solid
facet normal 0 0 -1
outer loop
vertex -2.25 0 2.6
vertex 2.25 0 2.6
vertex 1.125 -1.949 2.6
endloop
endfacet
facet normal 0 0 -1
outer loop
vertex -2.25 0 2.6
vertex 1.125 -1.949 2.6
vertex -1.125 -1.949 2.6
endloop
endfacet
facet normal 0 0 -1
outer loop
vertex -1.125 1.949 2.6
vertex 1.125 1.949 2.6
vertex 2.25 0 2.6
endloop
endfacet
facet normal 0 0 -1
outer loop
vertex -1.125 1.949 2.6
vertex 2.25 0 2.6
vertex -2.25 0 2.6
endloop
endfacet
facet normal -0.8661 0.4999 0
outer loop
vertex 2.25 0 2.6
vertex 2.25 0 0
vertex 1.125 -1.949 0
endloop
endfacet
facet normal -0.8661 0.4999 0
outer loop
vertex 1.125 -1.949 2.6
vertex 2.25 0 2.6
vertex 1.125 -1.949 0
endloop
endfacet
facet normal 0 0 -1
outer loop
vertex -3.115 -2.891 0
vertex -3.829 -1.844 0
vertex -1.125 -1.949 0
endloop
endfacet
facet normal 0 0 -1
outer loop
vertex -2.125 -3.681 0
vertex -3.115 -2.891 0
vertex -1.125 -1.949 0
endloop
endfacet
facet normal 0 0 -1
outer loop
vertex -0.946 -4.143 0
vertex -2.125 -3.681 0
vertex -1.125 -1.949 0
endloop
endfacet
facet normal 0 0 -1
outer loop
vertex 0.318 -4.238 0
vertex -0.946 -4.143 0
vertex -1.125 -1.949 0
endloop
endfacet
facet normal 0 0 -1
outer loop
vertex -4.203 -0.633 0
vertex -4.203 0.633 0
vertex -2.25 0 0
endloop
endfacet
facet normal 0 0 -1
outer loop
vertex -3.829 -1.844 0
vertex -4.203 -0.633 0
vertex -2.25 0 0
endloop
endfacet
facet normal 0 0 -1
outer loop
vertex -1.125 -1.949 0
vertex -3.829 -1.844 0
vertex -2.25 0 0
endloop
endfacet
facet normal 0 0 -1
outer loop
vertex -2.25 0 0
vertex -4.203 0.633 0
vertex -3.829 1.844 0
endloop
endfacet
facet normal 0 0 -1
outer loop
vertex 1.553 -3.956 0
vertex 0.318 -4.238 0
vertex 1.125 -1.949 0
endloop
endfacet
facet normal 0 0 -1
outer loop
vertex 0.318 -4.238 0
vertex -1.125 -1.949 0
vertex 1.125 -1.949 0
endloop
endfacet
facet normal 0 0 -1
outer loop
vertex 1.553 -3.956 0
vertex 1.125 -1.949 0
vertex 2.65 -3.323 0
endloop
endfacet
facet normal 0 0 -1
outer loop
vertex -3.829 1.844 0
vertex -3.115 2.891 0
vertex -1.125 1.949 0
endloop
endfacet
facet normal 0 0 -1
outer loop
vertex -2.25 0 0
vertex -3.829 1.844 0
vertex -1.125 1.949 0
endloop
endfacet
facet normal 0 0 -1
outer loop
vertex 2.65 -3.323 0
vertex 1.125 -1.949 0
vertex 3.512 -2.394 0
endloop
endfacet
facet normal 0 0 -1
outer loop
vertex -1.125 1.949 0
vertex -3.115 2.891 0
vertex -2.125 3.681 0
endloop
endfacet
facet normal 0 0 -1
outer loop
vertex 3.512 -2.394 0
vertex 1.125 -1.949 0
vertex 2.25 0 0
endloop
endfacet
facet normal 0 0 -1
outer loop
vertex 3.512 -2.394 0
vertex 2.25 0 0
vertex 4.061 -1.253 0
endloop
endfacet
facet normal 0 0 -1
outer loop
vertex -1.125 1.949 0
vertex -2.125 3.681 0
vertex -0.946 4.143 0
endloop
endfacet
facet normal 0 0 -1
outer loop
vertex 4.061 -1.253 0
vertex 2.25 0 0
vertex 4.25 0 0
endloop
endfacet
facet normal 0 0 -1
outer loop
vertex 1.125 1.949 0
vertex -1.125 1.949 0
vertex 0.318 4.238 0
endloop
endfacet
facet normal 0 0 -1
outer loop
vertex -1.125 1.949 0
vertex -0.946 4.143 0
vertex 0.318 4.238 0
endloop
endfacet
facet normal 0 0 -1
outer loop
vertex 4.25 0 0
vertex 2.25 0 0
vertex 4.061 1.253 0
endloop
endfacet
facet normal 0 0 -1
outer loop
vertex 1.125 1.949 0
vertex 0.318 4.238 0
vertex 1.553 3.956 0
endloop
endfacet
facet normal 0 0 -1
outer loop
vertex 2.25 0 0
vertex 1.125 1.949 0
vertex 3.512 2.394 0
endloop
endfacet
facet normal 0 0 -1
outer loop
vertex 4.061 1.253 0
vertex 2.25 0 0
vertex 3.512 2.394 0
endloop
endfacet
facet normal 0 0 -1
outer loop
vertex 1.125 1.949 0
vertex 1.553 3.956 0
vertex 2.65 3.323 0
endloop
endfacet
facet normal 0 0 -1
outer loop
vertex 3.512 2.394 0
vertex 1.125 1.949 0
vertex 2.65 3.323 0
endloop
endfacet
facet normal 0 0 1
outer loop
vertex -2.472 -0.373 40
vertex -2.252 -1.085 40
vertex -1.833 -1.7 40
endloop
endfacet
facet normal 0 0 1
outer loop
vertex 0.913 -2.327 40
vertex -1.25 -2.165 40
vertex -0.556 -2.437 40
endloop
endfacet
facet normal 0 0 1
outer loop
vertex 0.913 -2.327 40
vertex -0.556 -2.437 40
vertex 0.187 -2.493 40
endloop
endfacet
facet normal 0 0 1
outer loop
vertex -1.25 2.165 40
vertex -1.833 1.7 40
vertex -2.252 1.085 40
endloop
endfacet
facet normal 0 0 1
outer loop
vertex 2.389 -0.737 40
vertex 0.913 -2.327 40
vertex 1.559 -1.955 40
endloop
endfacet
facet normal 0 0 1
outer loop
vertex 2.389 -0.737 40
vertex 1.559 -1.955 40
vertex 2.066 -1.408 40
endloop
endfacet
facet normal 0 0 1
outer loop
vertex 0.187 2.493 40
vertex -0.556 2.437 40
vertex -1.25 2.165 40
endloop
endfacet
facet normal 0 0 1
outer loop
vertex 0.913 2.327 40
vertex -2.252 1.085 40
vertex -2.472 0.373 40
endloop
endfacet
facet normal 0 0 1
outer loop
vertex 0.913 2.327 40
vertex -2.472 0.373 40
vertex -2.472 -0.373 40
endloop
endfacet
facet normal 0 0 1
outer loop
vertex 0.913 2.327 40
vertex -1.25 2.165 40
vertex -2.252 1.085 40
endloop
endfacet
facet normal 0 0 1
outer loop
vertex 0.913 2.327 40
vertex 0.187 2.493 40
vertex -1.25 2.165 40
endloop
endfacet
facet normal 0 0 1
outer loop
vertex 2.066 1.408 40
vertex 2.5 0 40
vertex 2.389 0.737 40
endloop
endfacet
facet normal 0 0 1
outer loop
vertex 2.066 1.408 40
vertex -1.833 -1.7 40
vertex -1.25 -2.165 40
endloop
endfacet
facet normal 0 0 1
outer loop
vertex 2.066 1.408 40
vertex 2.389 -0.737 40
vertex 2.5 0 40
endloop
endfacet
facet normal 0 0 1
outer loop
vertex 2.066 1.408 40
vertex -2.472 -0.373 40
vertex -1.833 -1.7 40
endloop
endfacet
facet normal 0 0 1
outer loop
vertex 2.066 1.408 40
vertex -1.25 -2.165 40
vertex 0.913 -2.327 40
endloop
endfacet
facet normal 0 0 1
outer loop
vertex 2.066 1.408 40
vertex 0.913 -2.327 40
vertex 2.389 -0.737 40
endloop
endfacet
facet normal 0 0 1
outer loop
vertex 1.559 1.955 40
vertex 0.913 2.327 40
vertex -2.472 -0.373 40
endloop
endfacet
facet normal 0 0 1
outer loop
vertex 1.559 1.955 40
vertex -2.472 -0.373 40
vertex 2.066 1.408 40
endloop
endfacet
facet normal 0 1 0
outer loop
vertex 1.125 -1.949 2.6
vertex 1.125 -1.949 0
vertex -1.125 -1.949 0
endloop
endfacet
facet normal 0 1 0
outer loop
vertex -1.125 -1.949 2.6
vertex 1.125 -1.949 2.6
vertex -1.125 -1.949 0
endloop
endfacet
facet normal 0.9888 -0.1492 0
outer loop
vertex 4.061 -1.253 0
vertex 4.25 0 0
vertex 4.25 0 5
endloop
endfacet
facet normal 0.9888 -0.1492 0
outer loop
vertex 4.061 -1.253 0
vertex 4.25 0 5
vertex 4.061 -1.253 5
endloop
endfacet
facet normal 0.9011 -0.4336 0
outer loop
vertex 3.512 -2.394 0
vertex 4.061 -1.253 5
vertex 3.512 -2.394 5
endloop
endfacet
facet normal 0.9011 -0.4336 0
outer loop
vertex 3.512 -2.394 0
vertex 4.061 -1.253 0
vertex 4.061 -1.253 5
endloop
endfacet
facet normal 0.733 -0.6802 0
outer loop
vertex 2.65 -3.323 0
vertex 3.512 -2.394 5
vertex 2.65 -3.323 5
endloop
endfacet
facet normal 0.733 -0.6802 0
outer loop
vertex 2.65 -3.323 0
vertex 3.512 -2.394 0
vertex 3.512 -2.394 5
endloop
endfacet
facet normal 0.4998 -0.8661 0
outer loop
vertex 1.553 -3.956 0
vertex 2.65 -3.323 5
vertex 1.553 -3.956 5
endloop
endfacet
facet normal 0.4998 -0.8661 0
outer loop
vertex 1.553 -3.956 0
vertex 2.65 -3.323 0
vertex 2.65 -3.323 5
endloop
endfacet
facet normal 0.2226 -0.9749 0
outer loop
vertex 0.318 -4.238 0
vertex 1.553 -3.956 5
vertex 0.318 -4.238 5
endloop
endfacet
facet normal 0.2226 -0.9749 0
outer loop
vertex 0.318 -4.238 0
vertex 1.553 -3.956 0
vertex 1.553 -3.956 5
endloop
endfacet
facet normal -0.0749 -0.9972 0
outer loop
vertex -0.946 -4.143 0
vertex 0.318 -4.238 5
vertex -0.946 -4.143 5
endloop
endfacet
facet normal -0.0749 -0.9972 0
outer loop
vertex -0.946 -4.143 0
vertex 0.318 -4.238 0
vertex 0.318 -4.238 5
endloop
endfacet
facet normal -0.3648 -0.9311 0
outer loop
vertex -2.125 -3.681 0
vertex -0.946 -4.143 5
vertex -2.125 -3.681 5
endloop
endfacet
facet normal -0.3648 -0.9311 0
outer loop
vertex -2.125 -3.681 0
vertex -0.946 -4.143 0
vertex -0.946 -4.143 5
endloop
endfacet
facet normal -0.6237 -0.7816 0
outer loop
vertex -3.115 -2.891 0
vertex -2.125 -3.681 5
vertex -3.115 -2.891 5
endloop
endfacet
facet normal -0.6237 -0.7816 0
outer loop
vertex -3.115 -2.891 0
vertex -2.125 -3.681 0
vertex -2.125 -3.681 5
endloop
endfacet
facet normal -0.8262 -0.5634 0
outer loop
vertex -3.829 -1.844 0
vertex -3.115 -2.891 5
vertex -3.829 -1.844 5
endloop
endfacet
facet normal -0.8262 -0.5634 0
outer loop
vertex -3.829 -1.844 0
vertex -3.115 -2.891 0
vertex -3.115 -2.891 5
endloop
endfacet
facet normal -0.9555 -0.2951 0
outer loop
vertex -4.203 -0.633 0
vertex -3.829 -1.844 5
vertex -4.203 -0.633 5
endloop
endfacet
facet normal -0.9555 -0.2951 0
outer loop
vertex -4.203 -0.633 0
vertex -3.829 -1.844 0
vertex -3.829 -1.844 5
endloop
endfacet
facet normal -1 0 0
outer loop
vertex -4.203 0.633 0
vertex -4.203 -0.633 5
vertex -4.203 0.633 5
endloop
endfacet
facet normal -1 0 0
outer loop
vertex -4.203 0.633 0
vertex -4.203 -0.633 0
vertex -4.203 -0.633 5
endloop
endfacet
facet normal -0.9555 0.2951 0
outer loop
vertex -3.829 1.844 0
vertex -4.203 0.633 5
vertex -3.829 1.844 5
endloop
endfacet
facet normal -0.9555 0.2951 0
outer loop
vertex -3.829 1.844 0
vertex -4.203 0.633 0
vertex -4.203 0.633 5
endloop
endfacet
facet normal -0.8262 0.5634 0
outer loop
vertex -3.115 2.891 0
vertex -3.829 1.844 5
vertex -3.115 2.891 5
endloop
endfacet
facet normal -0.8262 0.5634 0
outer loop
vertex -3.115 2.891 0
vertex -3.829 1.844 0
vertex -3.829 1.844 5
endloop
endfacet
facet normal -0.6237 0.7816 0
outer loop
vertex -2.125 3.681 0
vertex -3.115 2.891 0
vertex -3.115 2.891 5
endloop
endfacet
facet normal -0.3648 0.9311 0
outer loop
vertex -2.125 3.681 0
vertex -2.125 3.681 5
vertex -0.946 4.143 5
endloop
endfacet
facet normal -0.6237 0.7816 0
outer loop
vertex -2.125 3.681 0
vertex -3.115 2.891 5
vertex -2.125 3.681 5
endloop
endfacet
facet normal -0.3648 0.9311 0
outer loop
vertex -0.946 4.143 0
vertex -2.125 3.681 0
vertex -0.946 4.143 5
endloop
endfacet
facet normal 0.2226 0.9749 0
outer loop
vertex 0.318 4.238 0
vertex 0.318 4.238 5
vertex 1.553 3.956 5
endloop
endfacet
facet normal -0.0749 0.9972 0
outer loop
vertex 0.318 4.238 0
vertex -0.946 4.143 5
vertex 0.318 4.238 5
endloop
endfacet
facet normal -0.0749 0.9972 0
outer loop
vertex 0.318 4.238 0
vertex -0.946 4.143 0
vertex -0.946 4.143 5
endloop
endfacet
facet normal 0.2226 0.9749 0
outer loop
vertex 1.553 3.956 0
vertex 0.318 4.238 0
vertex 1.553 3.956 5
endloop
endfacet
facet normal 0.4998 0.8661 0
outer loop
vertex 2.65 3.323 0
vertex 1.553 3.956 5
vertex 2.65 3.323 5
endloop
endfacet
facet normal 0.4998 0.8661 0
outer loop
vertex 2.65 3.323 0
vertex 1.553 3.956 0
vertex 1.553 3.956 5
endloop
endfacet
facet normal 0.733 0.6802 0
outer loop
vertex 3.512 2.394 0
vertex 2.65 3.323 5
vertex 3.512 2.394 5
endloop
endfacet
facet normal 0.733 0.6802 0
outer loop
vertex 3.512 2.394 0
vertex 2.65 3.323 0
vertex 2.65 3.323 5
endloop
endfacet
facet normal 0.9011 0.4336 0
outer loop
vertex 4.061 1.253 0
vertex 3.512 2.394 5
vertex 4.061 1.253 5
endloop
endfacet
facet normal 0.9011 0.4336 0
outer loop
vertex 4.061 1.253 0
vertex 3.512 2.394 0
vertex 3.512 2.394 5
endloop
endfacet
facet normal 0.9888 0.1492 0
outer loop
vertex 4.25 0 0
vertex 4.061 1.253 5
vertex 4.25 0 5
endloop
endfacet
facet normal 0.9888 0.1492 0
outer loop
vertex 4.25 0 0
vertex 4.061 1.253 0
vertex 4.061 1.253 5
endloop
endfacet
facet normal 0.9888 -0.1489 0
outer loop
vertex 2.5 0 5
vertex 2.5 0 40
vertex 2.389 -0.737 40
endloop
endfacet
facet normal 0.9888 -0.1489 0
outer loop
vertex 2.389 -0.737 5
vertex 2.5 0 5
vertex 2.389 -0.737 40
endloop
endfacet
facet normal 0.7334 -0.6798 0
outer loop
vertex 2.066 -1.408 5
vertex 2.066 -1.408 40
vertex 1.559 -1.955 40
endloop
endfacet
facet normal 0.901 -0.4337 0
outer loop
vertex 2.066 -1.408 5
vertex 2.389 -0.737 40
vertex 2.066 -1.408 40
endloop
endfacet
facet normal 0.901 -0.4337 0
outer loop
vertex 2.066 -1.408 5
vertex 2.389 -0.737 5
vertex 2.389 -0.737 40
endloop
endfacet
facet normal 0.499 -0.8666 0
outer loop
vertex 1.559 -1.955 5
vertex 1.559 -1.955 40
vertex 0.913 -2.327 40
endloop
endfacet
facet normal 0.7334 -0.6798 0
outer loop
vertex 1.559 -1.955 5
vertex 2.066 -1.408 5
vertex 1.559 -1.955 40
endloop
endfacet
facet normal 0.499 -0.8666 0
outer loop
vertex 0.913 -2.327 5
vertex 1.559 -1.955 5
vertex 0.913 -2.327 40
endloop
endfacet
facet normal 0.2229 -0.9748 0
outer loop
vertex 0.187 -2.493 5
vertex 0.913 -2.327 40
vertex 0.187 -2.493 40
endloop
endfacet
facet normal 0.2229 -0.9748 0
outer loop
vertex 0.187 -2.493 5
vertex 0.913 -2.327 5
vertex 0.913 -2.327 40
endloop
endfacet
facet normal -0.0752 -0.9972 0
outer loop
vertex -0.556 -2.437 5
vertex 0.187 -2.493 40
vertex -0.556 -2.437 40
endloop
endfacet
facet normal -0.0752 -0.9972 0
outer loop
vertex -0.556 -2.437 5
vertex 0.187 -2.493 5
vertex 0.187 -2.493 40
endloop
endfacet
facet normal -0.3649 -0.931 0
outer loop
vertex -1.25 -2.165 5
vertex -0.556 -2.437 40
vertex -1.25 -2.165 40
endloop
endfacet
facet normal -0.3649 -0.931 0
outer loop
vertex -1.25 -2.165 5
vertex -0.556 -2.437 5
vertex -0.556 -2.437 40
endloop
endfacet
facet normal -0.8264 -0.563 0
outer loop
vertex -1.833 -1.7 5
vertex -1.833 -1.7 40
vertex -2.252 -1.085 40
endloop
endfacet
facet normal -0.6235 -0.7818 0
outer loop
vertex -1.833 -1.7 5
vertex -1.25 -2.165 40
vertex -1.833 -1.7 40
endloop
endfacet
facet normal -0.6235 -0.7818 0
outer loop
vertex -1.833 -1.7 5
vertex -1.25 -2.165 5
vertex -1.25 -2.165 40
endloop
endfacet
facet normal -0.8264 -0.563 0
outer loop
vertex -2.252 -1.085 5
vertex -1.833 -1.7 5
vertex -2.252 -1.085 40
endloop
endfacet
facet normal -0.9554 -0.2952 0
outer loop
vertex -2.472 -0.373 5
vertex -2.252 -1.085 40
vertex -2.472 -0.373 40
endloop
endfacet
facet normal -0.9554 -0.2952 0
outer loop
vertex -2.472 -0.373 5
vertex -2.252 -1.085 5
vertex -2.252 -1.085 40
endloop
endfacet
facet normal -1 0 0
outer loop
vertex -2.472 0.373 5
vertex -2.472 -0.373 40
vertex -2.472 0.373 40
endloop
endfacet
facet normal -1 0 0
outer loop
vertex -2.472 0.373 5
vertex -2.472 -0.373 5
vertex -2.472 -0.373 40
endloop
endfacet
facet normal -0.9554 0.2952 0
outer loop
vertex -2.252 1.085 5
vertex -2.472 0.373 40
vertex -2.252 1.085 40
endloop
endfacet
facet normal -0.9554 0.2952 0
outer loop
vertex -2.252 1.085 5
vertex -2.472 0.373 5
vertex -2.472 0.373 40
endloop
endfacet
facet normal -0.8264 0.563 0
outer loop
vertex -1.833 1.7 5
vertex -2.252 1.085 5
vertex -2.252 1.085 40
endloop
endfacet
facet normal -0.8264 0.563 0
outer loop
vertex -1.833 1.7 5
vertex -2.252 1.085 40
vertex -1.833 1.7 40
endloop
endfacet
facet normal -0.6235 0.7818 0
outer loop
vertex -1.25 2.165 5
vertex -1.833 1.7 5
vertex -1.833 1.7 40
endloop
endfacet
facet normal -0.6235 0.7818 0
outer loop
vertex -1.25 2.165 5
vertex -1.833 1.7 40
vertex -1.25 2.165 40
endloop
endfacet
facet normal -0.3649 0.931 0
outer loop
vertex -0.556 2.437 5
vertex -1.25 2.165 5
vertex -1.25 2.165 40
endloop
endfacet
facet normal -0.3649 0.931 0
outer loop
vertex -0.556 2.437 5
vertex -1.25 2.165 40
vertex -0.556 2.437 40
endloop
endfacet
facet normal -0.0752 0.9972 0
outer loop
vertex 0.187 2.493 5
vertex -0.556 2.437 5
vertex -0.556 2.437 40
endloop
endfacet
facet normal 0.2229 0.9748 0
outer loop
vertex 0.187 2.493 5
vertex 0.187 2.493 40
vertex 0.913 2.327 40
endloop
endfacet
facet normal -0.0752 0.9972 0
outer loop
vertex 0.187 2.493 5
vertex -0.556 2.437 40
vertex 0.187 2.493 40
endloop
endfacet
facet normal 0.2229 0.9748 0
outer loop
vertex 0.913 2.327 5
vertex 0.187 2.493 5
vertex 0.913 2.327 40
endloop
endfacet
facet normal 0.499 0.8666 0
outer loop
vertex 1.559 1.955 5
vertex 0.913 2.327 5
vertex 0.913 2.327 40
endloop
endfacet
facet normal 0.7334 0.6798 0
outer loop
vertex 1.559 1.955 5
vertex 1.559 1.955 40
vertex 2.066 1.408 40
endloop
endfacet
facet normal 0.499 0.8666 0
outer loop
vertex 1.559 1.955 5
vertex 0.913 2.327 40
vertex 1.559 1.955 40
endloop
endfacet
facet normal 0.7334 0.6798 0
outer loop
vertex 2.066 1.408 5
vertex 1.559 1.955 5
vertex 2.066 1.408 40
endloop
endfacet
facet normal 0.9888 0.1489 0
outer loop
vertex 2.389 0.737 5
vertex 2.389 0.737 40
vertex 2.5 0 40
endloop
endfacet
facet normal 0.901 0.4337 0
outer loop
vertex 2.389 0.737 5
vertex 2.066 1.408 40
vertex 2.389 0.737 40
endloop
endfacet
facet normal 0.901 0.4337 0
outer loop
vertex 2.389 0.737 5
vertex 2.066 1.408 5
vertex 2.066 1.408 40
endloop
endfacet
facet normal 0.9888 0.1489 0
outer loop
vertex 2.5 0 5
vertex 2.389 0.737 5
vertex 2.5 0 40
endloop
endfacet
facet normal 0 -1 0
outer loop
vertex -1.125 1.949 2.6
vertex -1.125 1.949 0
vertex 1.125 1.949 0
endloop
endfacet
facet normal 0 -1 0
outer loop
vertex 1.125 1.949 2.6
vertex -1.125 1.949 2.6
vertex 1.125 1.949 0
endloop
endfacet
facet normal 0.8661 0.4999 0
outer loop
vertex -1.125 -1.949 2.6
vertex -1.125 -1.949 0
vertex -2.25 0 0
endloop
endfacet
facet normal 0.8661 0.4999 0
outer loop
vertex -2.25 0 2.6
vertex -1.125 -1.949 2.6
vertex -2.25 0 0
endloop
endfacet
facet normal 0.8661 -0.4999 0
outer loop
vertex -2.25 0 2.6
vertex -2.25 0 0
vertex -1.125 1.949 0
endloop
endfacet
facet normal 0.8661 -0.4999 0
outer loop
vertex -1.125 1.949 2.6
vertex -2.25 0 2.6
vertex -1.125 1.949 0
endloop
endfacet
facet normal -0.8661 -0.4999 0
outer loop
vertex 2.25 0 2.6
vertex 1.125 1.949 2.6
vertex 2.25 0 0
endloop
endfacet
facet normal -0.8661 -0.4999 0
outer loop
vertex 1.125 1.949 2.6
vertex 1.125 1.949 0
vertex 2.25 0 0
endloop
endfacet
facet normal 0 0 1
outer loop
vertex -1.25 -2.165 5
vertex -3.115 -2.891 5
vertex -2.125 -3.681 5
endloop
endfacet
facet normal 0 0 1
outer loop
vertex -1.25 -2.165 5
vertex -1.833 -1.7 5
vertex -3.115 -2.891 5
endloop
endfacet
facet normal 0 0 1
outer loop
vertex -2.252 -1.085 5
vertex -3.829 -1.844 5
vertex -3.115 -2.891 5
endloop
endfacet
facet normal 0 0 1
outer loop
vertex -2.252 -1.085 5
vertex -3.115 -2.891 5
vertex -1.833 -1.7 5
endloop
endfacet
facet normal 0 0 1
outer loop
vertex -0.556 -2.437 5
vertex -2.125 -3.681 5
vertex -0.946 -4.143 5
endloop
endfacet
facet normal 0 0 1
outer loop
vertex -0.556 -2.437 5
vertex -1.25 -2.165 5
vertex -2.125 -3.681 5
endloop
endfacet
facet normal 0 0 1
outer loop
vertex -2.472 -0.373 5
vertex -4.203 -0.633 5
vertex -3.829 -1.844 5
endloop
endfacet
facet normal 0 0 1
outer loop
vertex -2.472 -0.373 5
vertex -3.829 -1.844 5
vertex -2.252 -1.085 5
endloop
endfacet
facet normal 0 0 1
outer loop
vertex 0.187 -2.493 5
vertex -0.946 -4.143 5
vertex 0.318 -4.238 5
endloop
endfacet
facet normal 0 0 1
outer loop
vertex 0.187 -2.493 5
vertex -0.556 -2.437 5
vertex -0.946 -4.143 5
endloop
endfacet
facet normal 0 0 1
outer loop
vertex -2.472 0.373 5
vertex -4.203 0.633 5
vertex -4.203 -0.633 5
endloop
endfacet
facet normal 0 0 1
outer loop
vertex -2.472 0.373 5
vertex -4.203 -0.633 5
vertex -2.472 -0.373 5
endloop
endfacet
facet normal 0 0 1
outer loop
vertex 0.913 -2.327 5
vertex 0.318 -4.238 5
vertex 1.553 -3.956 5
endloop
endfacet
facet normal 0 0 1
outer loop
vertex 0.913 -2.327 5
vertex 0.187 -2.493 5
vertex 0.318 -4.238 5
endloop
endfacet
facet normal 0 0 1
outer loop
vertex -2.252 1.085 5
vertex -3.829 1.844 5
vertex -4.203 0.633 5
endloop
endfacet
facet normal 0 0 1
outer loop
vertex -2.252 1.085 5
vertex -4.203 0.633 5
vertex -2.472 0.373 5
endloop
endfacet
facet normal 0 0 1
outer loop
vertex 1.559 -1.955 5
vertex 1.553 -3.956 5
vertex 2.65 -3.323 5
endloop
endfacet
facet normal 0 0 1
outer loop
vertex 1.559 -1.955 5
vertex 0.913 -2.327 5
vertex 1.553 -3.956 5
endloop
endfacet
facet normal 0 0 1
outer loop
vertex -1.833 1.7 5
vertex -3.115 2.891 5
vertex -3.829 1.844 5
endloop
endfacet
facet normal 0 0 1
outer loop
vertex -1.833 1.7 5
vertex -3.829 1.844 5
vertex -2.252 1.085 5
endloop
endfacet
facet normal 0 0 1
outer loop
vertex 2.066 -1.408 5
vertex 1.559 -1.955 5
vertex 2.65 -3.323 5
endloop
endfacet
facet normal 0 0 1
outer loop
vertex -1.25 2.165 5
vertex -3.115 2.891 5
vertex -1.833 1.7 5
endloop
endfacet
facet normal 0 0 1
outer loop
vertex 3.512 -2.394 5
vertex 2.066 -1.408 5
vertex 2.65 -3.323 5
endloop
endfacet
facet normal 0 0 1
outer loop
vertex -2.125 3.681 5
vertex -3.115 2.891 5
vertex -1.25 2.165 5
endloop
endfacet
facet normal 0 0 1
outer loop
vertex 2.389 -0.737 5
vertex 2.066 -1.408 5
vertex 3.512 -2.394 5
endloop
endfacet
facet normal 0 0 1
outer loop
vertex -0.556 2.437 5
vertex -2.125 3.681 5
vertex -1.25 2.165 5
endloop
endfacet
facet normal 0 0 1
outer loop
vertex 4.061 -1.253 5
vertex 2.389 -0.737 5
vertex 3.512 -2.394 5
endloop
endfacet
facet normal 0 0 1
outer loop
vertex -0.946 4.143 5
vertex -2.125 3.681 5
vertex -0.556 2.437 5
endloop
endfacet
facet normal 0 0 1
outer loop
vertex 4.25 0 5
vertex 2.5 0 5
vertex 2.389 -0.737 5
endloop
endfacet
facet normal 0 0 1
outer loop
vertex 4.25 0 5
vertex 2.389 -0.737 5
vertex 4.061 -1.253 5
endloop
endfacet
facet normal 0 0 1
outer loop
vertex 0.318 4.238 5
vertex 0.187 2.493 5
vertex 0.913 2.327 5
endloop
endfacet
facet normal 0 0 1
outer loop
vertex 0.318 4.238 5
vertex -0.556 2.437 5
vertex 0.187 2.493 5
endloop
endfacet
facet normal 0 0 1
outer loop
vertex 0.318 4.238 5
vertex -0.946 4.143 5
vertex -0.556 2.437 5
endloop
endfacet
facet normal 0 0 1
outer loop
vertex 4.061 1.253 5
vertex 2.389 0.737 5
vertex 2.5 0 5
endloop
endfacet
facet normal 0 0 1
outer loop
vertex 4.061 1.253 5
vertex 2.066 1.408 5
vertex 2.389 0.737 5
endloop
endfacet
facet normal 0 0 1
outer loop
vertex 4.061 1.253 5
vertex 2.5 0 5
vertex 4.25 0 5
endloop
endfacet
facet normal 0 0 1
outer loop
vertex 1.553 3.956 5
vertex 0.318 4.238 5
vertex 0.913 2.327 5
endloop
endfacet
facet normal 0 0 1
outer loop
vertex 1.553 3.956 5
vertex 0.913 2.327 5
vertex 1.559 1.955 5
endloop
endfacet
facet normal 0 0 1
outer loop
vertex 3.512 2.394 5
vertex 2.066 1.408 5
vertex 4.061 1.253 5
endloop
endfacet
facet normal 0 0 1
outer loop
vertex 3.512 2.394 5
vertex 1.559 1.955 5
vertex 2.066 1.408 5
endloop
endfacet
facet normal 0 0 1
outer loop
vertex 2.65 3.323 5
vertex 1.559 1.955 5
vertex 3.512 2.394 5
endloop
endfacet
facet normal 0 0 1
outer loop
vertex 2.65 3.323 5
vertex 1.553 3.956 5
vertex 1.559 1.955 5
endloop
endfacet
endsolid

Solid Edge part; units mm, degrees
sketch "Sketch1" plane through (0, 0, 0) normal (0, 0, 1) x (1, 0, 0)
  circle A0 centre (0, 0) radius 4.25
  dimension "D1" = 8.5
extrude "Protrusion1" add sketch "Sketch1" along normal blind 5
sketch "Sketch2" plane through (0, 0, 5) normal (0, 0, 1) x (1, 0, 0)
  circle A0 centre (0, 0) radius 2.5
extrude "ExtrudedProtrusion_2" add sketch "Sketch2" along normal blind 35
sketch "Sketch3" plane through (0, 0, 0) normal (0, 0, -1) x (-1, 0, 0)
  line L0 (2.25, 0) -> (1.125, 1.9486)
  line L1 (1.125, 1.9486) -> (-1.125, 1.9486)
  line L2 (-1.125, 1.9486) -> (-2.25, 0)
  line L3 (-2.25, 0) -> (-1.125, -1.9486)
  line L4 (-1.125, -1.9486) -> (1.125, -1.9486)
  line L5 (1.125, -1.9486) -> (2.25, 0)
extrude "ExtrudedCutout_1" cut sketch "Sketch3" against normal blind 2.6
cosmetic_thread "Thread_1" size "M5" thread depth 24
properties material "Stainless steel"
